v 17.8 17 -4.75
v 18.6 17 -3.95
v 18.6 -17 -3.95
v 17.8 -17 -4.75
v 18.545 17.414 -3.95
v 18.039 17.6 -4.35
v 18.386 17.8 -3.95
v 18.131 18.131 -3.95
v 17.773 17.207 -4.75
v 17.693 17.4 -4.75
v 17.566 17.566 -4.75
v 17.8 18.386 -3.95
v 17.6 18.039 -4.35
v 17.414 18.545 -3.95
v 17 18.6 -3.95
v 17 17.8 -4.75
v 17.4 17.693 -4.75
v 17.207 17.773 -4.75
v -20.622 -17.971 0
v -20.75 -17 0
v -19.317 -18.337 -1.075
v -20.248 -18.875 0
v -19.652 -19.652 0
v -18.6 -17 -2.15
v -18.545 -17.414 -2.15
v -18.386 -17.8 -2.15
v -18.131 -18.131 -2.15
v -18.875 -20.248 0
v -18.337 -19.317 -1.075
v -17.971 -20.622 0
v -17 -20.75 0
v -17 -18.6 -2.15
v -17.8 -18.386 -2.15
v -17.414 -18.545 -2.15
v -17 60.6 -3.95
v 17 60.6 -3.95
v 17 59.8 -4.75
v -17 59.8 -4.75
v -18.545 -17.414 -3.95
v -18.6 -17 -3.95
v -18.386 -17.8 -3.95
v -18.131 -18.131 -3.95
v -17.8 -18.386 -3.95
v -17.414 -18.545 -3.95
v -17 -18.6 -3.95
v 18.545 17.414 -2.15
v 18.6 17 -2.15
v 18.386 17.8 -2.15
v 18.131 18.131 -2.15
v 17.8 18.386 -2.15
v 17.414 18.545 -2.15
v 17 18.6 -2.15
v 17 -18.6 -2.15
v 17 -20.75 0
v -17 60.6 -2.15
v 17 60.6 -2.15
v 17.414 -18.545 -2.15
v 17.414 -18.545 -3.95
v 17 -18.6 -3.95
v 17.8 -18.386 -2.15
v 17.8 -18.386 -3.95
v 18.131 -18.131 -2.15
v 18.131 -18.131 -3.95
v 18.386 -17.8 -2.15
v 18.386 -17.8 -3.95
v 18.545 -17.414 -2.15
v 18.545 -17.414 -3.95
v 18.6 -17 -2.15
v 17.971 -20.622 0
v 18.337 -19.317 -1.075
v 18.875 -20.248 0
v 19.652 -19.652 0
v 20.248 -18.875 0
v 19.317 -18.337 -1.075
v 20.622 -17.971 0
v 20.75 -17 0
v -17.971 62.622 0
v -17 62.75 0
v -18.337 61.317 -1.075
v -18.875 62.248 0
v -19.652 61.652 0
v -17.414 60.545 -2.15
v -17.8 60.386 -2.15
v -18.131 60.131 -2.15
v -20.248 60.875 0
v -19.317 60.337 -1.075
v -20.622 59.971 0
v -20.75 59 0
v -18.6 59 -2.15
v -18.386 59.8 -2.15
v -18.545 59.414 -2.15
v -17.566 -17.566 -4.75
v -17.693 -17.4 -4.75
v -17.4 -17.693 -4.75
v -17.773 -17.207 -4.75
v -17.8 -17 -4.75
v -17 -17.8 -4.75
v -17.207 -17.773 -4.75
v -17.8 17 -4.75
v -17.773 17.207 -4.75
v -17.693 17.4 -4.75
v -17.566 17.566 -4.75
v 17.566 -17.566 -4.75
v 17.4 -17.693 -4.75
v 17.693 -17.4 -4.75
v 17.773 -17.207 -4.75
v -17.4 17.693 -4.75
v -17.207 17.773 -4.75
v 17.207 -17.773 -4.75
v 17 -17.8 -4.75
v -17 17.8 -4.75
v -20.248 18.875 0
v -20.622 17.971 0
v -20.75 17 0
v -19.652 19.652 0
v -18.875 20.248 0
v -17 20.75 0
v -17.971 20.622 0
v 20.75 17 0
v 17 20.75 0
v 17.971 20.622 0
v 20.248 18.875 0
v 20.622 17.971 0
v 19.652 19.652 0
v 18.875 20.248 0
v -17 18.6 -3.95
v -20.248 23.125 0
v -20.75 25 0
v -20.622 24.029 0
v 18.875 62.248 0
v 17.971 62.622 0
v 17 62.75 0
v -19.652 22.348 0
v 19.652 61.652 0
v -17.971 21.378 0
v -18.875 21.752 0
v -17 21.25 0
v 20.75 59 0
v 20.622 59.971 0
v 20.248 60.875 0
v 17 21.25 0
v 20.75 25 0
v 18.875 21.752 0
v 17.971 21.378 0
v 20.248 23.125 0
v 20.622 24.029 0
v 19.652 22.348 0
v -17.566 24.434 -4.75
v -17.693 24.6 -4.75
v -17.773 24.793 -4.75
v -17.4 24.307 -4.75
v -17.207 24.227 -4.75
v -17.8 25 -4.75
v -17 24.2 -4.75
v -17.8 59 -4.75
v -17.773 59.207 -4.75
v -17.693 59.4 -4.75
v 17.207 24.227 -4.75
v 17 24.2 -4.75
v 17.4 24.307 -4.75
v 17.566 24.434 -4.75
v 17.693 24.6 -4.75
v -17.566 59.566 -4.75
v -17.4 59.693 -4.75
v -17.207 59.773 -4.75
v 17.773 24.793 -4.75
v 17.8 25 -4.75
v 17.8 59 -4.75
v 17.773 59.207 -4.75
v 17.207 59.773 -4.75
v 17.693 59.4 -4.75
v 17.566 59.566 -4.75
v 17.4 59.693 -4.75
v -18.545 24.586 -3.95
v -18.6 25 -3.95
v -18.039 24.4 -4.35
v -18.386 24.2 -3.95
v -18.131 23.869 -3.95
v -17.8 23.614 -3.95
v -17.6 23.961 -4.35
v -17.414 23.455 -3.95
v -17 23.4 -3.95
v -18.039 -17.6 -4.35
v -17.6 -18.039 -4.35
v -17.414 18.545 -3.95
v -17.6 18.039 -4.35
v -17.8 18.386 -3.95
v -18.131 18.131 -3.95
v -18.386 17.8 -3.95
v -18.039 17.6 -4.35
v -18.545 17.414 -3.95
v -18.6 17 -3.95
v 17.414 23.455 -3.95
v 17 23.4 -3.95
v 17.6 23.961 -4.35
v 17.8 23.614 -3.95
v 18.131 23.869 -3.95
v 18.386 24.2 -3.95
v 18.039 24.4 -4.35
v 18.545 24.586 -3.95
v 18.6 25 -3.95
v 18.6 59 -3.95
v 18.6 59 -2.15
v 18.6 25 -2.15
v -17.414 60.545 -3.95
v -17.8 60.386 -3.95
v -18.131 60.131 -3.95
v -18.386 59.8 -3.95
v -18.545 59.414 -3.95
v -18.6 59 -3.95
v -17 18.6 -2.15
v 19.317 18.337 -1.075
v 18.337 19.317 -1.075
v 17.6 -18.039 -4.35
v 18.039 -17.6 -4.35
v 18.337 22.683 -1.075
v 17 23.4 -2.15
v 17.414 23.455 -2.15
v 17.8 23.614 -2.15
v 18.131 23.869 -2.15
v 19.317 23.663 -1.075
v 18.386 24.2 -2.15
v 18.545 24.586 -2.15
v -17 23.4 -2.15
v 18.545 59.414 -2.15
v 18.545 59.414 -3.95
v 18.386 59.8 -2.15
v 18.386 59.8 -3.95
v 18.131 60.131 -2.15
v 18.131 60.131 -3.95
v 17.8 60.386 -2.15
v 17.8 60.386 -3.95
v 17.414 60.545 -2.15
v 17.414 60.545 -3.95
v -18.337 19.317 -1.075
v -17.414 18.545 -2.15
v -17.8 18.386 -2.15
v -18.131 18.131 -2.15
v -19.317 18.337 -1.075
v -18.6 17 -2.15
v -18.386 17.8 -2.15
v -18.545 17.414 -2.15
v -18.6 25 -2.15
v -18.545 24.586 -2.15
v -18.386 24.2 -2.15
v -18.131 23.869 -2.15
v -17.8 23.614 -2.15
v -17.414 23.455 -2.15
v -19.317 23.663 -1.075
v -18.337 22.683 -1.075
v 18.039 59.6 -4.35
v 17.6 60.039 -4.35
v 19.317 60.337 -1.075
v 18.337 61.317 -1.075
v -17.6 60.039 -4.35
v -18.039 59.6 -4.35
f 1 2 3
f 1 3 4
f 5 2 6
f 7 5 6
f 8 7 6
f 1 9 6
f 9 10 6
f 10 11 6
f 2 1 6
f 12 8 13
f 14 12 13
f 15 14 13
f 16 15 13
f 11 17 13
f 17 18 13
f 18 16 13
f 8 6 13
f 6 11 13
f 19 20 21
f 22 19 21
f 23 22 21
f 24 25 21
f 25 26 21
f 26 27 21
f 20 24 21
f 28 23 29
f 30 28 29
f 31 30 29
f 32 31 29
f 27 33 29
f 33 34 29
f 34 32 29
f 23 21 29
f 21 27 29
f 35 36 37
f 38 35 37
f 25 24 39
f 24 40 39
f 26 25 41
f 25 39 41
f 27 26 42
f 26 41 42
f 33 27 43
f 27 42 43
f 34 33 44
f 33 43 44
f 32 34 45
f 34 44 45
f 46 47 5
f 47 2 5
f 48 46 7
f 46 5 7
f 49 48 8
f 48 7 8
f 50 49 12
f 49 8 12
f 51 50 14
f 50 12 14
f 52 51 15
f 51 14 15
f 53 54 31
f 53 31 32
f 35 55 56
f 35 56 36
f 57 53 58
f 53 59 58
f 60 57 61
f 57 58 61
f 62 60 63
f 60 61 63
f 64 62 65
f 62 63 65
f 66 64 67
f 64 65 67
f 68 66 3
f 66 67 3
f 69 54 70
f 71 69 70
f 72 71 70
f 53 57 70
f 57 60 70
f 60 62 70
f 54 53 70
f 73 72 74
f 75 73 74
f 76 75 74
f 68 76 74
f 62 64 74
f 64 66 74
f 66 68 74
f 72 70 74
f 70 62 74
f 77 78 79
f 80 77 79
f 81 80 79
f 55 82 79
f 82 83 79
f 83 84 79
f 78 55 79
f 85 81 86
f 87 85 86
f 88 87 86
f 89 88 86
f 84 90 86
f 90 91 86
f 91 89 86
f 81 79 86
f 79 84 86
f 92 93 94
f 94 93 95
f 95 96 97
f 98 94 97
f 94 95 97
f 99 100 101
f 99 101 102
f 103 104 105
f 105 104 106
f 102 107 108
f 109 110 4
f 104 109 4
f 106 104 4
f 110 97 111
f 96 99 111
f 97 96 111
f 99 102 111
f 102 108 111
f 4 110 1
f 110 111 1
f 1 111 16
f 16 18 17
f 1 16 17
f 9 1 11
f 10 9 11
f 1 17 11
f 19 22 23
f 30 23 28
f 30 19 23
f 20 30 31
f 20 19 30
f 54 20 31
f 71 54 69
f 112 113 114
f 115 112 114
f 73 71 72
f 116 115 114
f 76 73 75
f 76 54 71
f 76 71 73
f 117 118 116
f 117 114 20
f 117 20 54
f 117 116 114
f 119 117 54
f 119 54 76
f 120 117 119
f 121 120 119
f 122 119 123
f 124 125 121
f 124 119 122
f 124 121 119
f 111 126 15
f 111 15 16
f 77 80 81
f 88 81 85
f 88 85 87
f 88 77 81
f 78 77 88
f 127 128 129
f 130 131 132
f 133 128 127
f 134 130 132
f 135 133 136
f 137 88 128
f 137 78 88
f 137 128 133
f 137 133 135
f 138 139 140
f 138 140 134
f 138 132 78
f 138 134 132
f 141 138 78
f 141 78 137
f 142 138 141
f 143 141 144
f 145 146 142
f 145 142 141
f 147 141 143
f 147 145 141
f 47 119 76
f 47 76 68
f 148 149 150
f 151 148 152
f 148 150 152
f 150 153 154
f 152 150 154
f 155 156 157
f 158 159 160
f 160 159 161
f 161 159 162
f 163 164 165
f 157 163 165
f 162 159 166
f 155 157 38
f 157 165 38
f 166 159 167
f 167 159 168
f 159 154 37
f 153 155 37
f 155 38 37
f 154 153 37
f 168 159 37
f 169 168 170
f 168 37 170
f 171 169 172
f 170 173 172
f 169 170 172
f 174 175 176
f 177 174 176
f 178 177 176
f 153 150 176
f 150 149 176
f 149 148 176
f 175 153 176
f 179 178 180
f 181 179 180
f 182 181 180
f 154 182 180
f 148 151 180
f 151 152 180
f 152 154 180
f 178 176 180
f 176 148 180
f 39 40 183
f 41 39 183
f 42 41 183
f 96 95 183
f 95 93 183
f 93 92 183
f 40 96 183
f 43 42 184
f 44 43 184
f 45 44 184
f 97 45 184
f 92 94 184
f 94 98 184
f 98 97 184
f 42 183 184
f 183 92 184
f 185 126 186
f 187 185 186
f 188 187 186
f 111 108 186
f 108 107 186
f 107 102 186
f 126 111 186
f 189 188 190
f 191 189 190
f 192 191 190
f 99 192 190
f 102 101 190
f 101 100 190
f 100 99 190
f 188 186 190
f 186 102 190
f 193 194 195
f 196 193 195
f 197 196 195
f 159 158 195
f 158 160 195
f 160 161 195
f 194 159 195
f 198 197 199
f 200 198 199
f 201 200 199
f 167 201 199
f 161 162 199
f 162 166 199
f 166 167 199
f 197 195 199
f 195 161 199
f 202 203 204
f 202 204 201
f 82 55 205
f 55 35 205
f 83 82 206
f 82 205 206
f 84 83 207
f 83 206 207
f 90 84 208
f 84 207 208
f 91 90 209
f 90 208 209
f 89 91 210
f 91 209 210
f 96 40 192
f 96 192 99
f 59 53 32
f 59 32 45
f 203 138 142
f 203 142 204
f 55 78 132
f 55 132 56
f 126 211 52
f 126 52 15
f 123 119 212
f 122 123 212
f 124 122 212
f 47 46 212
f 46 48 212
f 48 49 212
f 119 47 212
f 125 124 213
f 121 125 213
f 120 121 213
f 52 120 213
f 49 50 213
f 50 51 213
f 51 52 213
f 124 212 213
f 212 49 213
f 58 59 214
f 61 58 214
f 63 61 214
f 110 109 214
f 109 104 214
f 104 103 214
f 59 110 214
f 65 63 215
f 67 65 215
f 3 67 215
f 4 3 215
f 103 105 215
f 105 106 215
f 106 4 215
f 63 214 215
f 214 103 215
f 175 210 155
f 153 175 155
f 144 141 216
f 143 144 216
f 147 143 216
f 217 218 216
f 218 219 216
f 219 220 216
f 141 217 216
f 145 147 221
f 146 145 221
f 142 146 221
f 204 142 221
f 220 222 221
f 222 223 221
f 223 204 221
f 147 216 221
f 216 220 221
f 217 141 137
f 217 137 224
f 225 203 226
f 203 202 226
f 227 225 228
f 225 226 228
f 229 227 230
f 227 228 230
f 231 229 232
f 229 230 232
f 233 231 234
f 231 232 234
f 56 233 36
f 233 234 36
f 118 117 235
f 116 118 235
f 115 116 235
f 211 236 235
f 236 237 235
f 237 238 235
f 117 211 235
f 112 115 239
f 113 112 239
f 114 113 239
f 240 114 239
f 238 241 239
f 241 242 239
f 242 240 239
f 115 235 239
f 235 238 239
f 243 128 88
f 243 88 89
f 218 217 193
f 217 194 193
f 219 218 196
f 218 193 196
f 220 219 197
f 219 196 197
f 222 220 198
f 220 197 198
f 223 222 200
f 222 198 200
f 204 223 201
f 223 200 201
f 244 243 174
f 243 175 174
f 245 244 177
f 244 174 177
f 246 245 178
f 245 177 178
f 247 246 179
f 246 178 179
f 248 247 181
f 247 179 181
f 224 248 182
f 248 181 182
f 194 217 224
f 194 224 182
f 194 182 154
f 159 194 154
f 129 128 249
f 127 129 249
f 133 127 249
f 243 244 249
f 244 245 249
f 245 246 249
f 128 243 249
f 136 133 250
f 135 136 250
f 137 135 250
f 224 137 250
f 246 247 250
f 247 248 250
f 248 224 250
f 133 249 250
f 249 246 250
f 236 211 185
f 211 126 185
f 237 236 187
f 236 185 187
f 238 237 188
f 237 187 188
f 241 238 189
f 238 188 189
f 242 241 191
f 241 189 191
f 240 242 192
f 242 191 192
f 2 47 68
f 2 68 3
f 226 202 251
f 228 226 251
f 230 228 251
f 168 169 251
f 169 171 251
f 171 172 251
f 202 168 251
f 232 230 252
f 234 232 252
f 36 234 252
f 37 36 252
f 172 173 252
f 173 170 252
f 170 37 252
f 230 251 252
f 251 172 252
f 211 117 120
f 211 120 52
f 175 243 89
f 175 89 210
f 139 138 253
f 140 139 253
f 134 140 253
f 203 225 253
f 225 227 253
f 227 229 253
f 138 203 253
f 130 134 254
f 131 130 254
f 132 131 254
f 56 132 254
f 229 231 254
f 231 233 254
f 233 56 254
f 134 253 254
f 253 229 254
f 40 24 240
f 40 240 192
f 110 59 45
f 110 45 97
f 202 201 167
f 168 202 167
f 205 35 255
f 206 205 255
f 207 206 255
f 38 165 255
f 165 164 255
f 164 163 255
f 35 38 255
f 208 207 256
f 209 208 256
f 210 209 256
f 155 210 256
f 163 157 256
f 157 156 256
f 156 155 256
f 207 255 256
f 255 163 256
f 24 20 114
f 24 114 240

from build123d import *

# Parameters (mm, degrees)
PAD_DEPTH              = 4.75
LINEARPATTERN001_COUNT = 2
LINEARPATTERN001_PITCH = 42


with BuildPart() as part:
    # AdditivePipe: sweep along a path in Sketch
    with BuildLine(Plane.XY) as additivepipe_path:
        Line((-17, -21), (17, -21))
        ThreePointArc((17, -21), (19.8284271247, -19.8284271247), (21, -17))
        Line((21, -17), (21, 17))
        ThreePointArc((21, 17), (19.8284271247, 19.8284271247), (17, 21))
        Line((17, 21), (-17, 21))
        ThreePointArc((-17, 21), (-19.8284271247, 19.8284271247), (-21, 17))
        Line((-21, 17), (-21, -17))
        ThreePointArc((-21, -17), (-19.8284271247, -19.8284271247), (-17, -21))
    # Sketch001 → AdditivePipe (sweep)
    with BuildSketch(Plane.XZ):
        Polygon((-20.75, 0), (-18.6, -2.15), (-18.6, -3.95), (-17.8, -4.75), (-17.8, 0), align=None)
    additivepipe = sweep(path=additivepipe_path.line)

    # Sketch002 → Pad (new body)
    with BuildSketch(Plane.XY):
        with BuildLine():
            Line((-17, -17.8), (17, -17.8))
            ThreePointArc((17, -17.8), (17.5656854249, -17.5656854249), (17.8, -17))
            Line((17.8, -17), (17.8, 17))
            ThreePointArc((17.8, 17), (17.5656854249, 17.5656854249), (17, 17.8))
            Line((17, 17.8), (-17, 17.8))
            ThreePointArc((-17, 17.8), (-17.5656854249, 17.5656854249), (-17.8, 17))
            Line((-17.8, 17), (-17.8, -17))
            ThreePointArc((-17.8, -17), (-17.5656854249, -17.5656854249), (-17, -17.8))
        make_face()
    pad = extrude(amount=-PAD_DEPTH)

    # LinearPattern001: Pad, AdditivePipe ×2
    with Locations(*[(0, i * LINEARPATTERN001_PITCH, 0) for i in range(1, LINEARPATTERN001_COUNT)]):
        add(pad)
        add(additivepipe)


solid = part.part
